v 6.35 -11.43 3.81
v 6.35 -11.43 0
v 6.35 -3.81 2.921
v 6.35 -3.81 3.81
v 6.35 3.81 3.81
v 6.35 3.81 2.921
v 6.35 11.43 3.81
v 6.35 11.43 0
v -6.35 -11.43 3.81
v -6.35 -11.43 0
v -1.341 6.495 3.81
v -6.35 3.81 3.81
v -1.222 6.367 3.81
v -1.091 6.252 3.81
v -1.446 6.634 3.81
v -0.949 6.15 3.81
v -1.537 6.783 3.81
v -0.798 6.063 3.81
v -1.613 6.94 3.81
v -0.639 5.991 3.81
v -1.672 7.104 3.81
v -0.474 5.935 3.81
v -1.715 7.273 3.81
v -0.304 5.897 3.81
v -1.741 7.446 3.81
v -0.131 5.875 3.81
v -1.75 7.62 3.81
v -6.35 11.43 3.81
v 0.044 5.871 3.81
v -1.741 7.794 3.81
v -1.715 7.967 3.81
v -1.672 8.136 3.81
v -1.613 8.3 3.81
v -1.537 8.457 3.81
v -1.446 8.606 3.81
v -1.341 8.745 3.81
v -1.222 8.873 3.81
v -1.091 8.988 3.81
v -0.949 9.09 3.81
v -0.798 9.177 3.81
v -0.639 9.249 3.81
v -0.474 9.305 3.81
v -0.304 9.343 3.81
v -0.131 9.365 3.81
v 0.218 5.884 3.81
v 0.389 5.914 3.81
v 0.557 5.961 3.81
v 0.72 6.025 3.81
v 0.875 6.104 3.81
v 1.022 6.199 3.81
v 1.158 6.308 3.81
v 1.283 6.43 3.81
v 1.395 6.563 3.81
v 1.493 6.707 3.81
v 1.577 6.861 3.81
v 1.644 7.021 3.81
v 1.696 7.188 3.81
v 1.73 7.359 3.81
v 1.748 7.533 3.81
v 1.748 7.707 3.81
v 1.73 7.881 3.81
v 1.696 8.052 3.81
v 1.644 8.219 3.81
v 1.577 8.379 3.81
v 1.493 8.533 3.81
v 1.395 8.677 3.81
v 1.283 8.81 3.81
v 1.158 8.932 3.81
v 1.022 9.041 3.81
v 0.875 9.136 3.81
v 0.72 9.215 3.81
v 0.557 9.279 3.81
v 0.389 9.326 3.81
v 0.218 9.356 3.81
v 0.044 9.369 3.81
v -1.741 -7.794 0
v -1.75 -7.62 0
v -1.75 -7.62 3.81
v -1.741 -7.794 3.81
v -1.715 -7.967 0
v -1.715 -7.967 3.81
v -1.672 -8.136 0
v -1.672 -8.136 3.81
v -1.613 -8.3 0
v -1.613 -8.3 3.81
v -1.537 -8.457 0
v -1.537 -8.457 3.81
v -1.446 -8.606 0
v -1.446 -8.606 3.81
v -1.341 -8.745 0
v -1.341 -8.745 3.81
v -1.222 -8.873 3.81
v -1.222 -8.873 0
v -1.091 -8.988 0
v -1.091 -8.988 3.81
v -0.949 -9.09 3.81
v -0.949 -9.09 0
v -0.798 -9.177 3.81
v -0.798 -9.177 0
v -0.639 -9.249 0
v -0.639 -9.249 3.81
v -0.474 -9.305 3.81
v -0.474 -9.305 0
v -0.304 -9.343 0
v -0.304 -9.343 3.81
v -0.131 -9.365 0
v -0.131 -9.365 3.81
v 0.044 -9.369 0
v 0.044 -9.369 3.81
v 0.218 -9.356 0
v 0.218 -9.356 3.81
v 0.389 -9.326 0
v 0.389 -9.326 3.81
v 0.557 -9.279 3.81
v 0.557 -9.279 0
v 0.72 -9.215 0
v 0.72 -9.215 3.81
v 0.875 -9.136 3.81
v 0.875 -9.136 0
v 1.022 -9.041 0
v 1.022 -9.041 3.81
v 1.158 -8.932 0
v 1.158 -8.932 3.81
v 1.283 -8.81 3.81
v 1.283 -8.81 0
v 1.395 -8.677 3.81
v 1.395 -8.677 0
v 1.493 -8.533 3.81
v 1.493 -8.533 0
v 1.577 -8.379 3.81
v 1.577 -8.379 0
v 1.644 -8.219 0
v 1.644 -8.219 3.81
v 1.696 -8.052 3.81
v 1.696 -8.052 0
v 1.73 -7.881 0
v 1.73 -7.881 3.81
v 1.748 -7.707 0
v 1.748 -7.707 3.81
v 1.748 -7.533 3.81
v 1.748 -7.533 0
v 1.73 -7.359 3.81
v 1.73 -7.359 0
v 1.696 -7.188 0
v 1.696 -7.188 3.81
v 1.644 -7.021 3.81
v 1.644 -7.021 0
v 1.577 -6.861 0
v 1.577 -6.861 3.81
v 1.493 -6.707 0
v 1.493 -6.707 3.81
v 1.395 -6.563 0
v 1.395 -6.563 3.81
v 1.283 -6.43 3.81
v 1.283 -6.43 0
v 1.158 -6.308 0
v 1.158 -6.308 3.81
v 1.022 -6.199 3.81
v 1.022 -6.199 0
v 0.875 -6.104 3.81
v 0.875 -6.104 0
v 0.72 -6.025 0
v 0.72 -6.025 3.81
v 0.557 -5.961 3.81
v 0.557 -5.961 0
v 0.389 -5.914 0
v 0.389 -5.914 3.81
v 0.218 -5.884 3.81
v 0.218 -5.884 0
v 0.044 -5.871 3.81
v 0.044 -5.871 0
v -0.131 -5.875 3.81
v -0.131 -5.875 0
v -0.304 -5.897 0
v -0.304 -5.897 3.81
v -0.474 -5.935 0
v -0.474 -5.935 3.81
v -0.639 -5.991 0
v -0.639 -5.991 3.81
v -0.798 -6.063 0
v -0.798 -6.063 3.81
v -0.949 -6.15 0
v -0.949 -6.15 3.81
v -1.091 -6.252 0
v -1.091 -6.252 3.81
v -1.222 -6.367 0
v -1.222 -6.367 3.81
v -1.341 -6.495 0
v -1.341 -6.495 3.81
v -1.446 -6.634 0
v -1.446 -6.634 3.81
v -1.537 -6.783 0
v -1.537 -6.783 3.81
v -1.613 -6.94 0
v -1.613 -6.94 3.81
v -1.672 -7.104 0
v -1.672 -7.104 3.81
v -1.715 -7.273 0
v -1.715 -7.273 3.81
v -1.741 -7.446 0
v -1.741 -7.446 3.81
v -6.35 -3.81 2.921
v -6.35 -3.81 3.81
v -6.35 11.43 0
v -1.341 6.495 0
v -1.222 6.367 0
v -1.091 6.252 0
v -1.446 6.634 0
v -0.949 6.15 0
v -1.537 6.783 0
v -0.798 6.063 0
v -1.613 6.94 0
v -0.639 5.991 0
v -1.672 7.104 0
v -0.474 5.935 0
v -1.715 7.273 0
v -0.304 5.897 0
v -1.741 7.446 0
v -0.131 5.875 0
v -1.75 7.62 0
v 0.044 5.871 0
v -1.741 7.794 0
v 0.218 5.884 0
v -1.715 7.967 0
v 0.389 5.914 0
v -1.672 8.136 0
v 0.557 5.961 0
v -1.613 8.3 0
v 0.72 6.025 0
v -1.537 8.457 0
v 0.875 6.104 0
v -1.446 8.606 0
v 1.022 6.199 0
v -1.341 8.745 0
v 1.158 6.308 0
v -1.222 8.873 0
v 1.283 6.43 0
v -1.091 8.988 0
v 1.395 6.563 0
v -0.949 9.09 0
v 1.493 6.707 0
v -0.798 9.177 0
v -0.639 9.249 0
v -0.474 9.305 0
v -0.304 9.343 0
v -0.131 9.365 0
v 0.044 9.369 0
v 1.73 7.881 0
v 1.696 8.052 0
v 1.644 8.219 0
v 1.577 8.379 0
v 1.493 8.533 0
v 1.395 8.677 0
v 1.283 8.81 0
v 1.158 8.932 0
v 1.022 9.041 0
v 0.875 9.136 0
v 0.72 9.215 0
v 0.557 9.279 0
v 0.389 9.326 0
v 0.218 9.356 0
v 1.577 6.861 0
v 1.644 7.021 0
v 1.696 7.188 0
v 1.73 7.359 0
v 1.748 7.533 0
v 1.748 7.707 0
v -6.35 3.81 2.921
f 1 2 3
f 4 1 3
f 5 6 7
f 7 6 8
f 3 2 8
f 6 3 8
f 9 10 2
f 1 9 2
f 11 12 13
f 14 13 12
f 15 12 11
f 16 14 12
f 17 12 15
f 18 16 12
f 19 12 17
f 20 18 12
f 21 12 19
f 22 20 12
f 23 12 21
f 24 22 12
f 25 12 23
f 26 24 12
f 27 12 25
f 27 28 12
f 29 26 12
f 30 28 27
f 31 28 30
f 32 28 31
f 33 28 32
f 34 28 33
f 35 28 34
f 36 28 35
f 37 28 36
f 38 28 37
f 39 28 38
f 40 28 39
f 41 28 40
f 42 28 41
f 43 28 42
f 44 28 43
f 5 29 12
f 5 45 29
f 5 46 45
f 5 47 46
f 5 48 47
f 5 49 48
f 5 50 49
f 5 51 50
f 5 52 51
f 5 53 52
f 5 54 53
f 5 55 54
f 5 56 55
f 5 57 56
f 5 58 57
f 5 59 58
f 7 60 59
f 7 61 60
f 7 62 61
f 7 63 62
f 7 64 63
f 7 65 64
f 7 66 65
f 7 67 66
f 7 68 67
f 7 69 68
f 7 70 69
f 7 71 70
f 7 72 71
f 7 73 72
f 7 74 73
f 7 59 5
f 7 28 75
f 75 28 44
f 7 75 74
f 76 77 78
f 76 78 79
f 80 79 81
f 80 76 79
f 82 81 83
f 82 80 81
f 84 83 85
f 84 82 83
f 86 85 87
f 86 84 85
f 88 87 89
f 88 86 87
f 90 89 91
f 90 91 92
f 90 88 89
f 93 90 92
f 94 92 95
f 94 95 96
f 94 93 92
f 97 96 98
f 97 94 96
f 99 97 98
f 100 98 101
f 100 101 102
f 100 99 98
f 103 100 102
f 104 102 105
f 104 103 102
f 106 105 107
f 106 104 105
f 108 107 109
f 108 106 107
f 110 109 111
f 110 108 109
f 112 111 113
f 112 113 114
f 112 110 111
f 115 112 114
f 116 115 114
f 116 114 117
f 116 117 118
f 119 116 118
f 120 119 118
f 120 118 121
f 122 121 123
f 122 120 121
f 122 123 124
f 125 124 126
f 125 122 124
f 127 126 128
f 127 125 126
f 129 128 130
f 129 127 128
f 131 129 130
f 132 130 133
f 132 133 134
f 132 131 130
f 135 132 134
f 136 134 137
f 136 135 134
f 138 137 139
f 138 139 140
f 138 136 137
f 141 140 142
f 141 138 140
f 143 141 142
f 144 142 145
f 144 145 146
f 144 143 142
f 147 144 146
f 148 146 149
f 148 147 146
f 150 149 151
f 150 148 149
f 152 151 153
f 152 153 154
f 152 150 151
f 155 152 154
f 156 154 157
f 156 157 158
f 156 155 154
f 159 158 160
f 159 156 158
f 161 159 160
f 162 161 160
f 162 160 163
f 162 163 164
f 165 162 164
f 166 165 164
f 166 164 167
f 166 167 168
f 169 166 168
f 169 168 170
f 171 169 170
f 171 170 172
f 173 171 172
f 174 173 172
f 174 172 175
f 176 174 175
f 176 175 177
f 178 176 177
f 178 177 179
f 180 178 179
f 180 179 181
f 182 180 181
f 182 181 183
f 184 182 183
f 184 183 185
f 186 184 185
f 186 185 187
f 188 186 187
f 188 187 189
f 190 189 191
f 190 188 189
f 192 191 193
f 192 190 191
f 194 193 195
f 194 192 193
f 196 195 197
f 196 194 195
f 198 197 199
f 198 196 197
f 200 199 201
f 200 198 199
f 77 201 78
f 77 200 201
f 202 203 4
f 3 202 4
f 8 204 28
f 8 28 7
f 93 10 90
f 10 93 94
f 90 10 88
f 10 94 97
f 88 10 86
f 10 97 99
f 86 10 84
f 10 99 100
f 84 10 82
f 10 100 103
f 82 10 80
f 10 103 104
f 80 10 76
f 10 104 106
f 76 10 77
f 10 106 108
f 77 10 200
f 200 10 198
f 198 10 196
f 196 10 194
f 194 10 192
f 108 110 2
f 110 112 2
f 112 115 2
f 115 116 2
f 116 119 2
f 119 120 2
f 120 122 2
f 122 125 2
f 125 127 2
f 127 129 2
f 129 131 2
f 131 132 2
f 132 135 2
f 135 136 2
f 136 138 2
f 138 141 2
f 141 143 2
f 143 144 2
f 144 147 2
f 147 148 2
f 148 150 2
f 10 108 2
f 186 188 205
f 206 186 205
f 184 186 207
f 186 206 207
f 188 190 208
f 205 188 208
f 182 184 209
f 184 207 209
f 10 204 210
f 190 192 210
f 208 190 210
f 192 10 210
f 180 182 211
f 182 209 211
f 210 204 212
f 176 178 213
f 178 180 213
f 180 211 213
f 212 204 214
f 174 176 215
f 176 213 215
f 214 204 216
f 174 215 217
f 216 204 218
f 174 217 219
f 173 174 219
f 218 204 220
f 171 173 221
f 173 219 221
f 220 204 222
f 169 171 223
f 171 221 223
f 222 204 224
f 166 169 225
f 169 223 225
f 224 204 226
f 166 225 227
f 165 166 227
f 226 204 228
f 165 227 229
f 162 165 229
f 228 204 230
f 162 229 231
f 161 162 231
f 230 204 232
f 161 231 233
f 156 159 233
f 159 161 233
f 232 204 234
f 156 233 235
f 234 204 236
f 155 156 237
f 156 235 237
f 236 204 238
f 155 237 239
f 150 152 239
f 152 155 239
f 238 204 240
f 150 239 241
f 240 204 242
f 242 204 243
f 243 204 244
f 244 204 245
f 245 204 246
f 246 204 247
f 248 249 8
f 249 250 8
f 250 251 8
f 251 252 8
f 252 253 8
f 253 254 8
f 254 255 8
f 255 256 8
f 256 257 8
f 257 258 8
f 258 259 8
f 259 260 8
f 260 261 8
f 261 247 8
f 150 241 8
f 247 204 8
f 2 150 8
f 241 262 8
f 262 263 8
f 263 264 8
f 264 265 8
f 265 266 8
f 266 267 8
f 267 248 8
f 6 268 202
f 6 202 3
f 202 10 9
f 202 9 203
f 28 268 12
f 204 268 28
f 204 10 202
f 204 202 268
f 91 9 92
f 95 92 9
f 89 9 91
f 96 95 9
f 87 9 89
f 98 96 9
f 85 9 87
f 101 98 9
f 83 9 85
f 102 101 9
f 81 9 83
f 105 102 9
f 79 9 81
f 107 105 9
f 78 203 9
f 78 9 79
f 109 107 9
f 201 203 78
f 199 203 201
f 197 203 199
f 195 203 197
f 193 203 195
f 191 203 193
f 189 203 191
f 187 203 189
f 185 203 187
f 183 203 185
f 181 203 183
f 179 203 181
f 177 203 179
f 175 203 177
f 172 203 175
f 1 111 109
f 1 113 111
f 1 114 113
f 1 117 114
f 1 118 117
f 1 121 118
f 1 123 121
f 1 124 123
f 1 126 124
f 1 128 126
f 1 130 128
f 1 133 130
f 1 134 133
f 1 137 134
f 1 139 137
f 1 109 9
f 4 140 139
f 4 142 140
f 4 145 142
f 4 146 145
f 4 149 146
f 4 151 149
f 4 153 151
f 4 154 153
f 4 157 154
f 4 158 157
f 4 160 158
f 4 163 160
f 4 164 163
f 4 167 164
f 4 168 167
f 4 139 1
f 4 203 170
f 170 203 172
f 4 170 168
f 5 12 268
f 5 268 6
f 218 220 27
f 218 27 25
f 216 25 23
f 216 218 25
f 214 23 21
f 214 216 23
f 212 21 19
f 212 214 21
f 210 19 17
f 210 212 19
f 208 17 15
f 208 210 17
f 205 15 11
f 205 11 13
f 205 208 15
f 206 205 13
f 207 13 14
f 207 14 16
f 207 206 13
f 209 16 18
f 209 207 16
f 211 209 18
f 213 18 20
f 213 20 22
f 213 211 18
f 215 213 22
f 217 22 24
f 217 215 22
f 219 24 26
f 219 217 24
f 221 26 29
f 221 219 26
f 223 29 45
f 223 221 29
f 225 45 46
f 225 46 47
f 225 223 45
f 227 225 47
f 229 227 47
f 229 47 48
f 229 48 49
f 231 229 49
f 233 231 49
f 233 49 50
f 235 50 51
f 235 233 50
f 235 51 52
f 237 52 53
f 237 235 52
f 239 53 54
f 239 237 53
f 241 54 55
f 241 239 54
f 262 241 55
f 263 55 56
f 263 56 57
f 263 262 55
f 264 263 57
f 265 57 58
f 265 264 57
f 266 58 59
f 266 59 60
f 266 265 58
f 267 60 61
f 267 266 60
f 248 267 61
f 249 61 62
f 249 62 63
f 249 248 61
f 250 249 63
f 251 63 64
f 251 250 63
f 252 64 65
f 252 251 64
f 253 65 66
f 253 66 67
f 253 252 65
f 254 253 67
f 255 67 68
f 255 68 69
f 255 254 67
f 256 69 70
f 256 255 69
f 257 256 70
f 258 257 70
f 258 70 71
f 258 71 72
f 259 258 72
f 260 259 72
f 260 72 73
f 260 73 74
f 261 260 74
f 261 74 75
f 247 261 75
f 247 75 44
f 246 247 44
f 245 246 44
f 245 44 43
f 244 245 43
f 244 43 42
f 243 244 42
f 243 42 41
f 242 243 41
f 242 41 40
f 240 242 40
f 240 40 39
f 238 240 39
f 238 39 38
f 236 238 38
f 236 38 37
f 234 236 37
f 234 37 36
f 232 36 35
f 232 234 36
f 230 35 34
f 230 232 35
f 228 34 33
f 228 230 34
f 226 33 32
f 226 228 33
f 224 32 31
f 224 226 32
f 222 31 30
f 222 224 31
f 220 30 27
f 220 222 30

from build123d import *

# Parameters (mm, degrees)
SKETCH1_W           = 12.7
SKETCH1_H           = 22.86
SKETCH1_R           = 1.75
BOSS_EXTRUDE1_DEPTH = 3.81
SKETCH2_W           = 12.7
SKETCH2_H           = 7.62
CUT_EXTRUDE1_DEPTH  = 0.889


with BuildPart() as part:
    # Sketch1 → Boss-Extrude1 (new body)
    with BuildSketch(Plane.XY):
        Rectangle(SKETCH1_W, SKETCH1_H)
        with Locations(Location((0, 7.62, 0), (0, 0, 180))):
            Circle(SKETCH1_R, mode=Mode.SUBTRACT)
        with Locations(Location((0, -7.62, 0), (0, 0, 180))):
            Circle(SKETCH1_R, mode=Mode.SUBTRACT)
    extrude(amount=BOSS_EXTRUDE1_DEPTH)

    # Sketch2 → Cut-Extrude1 (cut)
    with BuildSketch(Plane.XY.offset(3.81)):
        Rectangle(SKETCH2_W, SKETCH2_H)
    extrude(amount=-CUT_EXTRUDE1_DEPTH, mode=Mode.SUBTRACT)


solid = part.part
